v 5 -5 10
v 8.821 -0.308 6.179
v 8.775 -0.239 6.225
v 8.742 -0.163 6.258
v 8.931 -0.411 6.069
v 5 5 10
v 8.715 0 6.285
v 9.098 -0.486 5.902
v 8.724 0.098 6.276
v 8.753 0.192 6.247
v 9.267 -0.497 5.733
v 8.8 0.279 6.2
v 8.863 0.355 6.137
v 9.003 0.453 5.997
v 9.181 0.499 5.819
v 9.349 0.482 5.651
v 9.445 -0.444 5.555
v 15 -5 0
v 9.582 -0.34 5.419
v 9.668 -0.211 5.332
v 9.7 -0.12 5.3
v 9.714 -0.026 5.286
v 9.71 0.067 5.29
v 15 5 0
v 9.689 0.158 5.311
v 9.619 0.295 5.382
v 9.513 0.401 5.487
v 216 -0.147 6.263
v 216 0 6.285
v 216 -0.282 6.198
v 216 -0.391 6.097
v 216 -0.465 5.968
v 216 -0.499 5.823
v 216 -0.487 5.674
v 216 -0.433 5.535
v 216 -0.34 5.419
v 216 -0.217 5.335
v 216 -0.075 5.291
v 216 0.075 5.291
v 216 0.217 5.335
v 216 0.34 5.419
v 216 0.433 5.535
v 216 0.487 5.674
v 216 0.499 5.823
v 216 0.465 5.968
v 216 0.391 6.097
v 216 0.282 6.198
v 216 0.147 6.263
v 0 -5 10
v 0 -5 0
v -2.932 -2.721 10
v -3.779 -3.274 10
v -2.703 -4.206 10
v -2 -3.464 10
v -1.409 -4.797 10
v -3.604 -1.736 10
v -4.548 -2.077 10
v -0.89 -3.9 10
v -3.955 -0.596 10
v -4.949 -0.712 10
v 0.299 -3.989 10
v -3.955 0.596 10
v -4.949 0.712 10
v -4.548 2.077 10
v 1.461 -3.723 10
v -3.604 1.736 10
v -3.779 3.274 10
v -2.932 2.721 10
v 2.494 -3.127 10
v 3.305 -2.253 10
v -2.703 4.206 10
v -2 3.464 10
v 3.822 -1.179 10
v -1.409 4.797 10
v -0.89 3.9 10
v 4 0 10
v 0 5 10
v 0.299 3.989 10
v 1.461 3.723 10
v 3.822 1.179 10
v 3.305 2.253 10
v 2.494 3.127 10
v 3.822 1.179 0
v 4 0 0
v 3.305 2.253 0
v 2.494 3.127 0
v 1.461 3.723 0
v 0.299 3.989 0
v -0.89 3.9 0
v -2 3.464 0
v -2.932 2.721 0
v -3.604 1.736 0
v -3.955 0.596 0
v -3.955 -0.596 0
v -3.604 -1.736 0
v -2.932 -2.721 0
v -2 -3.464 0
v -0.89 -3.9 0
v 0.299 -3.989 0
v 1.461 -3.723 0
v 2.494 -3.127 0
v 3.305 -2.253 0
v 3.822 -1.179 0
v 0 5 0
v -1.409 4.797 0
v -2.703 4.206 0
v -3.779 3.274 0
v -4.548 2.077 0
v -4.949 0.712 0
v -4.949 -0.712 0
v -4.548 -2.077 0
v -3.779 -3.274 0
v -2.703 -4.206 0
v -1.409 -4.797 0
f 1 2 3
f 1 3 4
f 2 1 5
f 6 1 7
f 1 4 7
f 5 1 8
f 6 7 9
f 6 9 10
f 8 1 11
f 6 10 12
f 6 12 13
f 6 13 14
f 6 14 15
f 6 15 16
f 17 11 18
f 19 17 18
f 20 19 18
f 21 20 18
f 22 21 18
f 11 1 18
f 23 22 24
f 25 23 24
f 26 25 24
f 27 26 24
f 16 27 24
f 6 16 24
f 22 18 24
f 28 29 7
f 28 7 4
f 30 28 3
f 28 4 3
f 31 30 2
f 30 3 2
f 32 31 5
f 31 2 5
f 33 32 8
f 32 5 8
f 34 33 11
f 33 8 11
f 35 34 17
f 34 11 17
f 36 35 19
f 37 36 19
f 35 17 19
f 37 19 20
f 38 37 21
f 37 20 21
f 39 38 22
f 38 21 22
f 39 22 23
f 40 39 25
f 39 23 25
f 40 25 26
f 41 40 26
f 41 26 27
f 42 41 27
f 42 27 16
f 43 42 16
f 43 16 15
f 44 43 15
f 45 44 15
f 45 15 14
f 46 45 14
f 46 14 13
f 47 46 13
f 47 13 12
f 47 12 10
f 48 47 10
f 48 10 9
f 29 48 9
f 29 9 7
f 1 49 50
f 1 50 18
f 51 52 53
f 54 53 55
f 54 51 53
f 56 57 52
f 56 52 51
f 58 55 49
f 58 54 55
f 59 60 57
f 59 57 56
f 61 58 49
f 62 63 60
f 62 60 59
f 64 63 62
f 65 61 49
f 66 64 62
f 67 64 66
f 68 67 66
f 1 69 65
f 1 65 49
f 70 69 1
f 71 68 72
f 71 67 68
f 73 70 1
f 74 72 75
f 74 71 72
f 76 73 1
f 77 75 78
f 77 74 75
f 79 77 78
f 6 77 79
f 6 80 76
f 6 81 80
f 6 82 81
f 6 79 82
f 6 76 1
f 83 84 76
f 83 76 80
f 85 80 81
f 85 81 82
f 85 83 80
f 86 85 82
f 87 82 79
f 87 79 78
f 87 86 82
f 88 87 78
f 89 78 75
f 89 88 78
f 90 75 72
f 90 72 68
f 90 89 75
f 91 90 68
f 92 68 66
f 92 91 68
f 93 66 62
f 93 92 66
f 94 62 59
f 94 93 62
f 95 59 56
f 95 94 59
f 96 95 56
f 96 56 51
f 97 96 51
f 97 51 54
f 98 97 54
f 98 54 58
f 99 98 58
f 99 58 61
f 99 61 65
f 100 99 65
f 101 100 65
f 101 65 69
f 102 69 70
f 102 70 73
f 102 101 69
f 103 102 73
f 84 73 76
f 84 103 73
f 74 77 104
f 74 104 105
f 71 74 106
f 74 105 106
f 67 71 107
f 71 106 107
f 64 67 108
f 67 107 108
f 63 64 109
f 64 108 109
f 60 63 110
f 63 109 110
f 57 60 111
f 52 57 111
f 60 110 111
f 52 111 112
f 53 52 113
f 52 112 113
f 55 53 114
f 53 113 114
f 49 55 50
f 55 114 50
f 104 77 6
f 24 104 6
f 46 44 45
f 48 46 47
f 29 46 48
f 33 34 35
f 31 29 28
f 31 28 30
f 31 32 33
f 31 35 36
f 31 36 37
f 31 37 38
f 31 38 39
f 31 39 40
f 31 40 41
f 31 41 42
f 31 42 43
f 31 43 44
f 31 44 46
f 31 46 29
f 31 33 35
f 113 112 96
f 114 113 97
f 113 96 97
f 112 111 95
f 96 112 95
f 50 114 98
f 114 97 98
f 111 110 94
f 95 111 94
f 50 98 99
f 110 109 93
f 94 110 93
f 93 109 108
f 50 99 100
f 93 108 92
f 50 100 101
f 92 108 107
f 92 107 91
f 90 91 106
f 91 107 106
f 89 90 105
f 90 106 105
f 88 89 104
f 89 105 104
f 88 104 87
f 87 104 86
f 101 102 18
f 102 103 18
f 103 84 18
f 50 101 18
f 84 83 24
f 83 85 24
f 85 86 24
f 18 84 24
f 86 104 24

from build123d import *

# Parameters (mm, degrees)
SZKIC1_R                    = 5
SZKIC1_R_2                  = 4
DODANIE_WYCI_GNI_CIE1_DEPTH = 10
SZKIC2_W                    = 10
SZKIC2_H                    = 10
DODANIE_WYCI_GNI_CIE2_DEPTH = 10
DODANIE_WYCI_GNI_CIE3_DEPTH = 10
DODANIE_WYCI_GNI_CIE4_DEPTH = 10
SFAZOWANIE1_SIZE            = 10
DODANIE_WYCI_GNI_CIE6_START = 6
SZKIC6_R                    = 0.5
DODANIE_WYCI_GNI_CIE6_DEPTH = 210


with BuildPart() as part:
    # Szkic1 → Dodanie-wyciągnięcie1 (new body)
    with BuildSketch(Plane.XY):
        Circle(SZKIC1_R)
        Circle(SZKIC1_R_2, mode=Mode.SUBTRACT)
    extrude(amount=DODANIE_WYCI_GNI_CIE1_DEPTH)



with BuildPart() as body_2:
    # Szkic2 → Dodanie-wyciągnięcie2 (new body)
    with BuildSketch(Plane.XY.offset(10)):
        with Locations((10, 0)):
            Rectangle(SZKIC2_W, SZKIC2_H)
    extrude(amount=-DODANIE_WYCI_GNI_CIE2_DEPTH)


with BuildPart() as part_1:
    add(part.part)

    add(body_2.part)  # Dodanie-wyciągnięcie3 merges body 2
    # Szkic3 → Dodanie-wyciągnięcie3 (add)
    with BuildSketch(Plane.XY):
        Polygon((0, 5), (5, 5), (5, 0), (3.357304053, 3.705200331), align=None)
    extrude(amount=DODANIE_WYCI_GNI_CIE3_DEPTH)

    # Szkic5 → Dodanie-wyciągnięcie4 (add)
    with BuildSketch(Plane(origin=(0, 0, 0), x_dir=(-1, 0, 0), z_dir=(0, 0, -1))):
        Polygon((-5, -5), (-5, 0), (-3.105231781, -3.918869172), (0, -5), align=None)
    extrude(amount=-DODANIE_WYCI_GNI_CIE4_DEPTH)

    # Sfazowanie1
    sfazowanie1_edges = [part_1.edges().sort_by_distance(p)[0] for p in [
        (15, 0, 10),
    ]]
    chamfer(sfazowanie1_edges, length=SFAZOWANIE1_SIZE - 0.0001)  # a hair under: the kernel refuses the full size

    # Szkic6 → Dodanie-wyciągnięcie6 (add)
    with BuildSketch(Plane(origin=(0, 0, 0), x_dir=(0, 0, -1), z_dir=(1, 0, 0)).offset(DODANIE_WYCI_GNI_CIE6_START)):
        with Locations(Location((-5.785366317, 0, 0), (0, 0, 180))):
            Circle(SZKIC6_R)
    extrude(amount=DODANIE_WYCI_GNI_CIE6_DEPTH)


solid = part_1.part
